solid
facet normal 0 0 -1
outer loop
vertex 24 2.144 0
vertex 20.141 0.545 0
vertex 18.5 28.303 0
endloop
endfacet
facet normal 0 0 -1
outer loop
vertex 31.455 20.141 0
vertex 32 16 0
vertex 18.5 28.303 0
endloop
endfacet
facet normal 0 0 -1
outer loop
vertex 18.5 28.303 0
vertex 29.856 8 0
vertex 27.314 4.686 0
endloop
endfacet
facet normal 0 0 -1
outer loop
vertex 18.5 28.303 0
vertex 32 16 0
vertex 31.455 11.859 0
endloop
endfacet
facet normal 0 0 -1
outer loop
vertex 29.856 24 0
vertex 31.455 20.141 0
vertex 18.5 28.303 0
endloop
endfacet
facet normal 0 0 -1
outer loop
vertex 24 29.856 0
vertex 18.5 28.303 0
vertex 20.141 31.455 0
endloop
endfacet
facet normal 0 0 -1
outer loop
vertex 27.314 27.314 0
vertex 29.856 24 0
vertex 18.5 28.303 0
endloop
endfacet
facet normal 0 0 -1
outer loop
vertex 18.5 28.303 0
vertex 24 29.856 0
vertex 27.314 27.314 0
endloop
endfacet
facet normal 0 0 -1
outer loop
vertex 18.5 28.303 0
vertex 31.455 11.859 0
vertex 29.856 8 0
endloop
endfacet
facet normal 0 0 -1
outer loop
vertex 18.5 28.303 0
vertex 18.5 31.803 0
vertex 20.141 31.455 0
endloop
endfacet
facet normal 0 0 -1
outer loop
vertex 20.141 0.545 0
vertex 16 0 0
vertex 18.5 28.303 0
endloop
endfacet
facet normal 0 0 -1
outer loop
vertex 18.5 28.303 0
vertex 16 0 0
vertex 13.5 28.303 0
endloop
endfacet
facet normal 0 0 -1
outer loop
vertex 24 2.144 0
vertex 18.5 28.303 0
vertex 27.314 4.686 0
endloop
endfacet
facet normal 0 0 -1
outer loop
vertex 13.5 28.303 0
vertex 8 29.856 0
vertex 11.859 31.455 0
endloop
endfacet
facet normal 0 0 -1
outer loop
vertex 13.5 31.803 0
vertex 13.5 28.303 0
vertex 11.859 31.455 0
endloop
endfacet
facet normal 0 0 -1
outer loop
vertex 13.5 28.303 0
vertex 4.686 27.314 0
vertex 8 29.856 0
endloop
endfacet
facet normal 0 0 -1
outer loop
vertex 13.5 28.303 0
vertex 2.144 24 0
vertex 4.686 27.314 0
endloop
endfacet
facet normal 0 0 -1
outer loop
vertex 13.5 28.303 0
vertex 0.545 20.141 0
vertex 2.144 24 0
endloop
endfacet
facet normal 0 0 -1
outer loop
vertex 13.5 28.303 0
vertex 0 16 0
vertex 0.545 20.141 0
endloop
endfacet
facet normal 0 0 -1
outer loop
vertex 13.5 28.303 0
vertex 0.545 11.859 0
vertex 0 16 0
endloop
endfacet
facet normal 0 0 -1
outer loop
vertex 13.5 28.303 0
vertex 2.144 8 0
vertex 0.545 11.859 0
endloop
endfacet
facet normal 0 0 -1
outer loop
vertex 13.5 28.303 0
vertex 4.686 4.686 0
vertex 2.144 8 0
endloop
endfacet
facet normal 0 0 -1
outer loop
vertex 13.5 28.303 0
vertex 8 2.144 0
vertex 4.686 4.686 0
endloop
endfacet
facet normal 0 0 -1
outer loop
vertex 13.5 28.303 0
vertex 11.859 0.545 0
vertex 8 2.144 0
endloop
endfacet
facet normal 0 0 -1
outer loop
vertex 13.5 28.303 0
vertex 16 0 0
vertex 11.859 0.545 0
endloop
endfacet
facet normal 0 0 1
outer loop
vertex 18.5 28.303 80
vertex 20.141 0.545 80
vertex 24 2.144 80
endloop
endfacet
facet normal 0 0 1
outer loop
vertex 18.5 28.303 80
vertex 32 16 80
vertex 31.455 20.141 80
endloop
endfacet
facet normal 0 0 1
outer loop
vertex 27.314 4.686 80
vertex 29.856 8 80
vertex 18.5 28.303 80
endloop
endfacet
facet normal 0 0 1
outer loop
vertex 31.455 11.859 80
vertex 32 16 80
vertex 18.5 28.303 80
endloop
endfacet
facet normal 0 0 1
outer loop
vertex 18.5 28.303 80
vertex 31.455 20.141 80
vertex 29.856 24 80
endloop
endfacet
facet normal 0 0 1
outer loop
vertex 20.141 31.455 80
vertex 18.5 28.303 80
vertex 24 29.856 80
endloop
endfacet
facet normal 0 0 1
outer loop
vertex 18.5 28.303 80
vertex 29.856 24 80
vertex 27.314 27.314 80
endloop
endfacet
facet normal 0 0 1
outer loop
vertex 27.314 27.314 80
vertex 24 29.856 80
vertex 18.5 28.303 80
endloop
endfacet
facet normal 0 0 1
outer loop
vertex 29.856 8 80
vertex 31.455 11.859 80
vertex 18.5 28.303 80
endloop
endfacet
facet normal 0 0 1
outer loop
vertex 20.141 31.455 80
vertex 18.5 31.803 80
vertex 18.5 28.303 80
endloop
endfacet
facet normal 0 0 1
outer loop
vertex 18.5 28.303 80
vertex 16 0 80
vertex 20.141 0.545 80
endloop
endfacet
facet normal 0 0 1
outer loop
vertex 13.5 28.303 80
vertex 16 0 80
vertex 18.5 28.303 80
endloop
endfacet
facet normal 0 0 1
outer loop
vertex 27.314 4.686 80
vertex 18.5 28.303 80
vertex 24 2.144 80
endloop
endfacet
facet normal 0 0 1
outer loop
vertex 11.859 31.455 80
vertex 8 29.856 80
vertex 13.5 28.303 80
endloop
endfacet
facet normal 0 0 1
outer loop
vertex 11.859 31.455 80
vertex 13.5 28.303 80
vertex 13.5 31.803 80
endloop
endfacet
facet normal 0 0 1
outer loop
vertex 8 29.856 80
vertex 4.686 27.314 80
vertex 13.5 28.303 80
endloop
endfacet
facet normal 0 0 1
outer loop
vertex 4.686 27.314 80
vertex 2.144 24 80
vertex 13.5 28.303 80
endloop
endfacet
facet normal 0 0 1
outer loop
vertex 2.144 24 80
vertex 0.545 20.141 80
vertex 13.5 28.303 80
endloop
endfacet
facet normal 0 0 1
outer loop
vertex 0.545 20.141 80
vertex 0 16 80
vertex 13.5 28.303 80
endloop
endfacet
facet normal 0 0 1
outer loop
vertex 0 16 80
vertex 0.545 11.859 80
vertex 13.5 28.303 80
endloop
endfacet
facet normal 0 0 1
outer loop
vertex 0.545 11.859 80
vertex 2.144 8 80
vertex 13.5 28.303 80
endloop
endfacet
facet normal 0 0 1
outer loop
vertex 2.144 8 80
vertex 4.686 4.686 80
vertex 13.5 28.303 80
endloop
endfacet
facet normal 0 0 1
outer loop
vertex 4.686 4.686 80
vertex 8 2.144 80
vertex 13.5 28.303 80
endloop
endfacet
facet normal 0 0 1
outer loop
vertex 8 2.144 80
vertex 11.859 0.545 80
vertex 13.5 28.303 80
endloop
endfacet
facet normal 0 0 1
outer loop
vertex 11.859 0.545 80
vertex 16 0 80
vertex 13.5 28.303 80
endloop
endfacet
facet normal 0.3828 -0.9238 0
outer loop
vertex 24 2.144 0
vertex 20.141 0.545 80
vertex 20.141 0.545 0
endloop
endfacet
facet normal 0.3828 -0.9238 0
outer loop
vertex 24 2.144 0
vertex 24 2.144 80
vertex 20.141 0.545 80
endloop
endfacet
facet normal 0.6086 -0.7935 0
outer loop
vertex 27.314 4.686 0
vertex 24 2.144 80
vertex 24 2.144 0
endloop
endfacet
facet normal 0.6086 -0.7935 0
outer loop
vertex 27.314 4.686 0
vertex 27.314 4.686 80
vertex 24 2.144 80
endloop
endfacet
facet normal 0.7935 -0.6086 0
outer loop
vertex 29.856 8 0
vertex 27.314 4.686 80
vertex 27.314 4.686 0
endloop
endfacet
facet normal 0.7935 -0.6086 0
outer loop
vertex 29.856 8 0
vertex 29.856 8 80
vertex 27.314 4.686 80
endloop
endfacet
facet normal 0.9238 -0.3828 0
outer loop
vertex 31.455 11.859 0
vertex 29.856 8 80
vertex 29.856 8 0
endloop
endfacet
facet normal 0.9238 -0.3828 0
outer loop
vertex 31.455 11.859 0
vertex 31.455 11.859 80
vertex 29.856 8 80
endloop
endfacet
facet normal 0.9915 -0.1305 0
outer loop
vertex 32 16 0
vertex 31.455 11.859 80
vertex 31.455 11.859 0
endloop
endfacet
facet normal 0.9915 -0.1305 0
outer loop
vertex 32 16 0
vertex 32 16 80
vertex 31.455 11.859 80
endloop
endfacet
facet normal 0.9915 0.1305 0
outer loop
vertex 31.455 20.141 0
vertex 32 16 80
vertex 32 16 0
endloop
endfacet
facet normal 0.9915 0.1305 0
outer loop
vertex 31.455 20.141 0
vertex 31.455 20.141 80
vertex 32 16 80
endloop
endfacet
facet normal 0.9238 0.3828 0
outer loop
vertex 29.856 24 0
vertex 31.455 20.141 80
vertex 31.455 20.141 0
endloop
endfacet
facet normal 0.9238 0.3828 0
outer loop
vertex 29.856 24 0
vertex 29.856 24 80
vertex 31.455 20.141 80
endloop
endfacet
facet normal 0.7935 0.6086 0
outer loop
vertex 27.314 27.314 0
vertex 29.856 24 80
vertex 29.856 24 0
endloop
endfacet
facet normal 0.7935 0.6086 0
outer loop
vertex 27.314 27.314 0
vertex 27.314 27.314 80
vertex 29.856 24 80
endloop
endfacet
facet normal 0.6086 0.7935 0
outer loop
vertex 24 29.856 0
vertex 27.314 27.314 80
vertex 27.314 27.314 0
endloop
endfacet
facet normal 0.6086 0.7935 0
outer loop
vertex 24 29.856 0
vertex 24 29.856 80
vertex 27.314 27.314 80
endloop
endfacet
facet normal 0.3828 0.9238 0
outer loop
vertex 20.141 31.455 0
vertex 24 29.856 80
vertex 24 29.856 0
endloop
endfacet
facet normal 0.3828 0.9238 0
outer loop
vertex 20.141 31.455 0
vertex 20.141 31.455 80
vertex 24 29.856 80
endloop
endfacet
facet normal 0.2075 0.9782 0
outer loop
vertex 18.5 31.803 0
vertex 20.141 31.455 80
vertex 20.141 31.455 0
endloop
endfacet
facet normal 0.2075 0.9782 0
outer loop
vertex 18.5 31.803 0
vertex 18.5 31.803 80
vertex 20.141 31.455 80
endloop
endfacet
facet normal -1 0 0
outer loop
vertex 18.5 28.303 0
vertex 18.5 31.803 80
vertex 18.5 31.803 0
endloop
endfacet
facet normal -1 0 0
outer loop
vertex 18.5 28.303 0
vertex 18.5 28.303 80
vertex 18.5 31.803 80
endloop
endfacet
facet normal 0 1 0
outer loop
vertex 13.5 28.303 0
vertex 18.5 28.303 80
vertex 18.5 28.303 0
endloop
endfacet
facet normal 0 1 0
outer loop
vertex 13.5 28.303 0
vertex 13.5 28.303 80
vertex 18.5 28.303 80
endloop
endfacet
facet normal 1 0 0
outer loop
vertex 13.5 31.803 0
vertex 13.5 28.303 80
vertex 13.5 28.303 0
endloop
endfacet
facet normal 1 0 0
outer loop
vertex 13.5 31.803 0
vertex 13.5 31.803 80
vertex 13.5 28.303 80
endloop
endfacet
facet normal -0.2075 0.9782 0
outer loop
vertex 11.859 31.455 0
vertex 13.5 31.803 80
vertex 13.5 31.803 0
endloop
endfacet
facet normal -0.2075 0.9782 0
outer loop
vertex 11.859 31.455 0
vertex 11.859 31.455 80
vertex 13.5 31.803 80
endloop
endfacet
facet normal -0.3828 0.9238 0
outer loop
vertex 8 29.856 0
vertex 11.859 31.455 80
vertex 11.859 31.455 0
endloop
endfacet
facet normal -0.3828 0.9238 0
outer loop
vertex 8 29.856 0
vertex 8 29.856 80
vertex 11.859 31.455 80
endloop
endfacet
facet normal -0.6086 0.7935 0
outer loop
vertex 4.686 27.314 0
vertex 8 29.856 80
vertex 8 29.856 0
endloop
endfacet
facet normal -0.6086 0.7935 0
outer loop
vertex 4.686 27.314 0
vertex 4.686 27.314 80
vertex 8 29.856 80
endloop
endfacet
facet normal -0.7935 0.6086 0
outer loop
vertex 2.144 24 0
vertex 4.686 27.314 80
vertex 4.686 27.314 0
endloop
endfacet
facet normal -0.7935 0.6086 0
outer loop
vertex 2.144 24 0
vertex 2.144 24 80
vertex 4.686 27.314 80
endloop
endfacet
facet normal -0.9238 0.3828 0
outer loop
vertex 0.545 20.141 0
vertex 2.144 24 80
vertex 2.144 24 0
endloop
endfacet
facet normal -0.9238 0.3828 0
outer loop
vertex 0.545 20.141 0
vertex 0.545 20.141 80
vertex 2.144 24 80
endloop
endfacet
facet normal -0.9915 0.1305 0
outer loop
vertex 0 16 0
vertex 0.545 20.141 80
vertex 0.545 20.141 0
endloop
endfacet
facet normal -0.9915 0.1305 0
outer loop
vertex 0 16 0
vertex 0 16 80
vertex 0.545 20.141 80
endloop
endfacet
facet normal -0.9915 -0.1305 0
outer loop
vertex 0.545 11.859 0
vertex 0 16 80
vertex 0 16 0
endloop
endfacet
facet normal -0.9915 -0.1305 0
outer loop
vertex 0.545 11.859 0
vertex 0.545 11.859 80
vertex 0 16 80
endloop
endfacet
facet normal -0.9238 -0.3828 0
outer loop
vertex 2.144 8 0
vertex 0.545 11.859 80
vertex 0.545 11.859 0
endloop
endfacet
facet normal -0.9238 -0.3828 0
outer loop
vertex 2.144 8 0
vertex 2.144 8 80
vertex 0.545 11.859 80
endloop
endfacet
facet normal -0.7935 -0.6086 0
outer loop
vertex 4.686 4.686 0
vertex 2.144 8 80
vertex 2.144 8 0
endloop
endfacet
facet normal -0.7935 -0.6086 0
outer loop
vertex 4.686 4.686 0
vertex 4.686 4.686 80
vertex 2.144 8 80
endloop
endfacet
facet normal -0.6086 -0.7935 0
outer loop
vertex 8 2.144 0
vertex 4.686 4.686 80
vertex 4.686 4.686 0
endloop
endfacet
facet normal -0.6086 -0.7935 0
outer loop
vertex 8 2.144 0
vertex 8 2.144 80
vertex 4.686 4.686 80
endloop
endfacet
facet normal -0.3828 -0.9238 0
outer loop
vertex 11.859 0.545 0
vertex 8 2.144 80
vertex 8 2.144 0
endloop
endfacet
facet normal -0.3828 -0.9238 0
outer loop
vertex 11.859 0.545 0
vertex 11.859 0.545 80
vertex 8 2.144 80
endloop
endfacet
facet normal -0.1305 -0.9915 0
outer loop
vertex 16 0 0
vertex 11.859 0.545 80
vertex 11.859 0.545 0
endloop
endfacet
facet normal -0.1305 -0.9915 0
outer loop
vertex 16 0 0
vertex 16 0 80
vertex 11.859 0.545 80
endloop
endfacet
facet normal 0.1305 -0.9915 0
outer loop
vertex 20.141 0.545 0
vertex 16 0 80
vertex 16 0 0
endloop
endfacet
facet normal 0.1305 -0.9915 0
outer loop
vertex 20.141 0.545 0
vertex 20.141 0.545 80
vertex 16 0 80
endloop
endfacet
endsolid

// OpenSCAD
$fn = 32;

// ----------------------------------------------------------------------
// Keyway shaft: d32 shaft, key 5 x 3.5 mm
// ----------------------------------------------------------------------

// --- parameters (mm) ---
shaft_r = 16;             // shaft radius
key_w = 5;                // keyway width
key_d = 3.5;              // keyway depth below the surface line
plate_t = 80;             // shaft length, Z (extrusion height)

shaft_d = 2 * shaft_r;  // shaft diameter
circle_step = 15;  // polygon sampling step, degrees

profile = [[11.859, 31.455], [8, 29.856], [4.686, 27.314], [2.144, 24], [0.545, 20.141], [0, 16], [0.545, 11.859], [2.144, 8], [4.686, 4.686], [8, 2.144], [11.859, 0.545], [16, 0], [20.141, 0.545], [24, 2.144], [27.314, 4.686], [29.856, 8], [31.455, 11.859], [32, 16], [31.455, 20.141], [29.856, 24], [27.314, 27.314], [24, 29.856], [20.141, 31.455], [18.5, 31.803], [18.5, 28.303], [13.5, 28.303], [13.5, 31.803]];  // primary outline, 27 points, counter clockwise

// --- the one profile operation ---
linear_extrude(height = plate_t) polygon(points = profile);
